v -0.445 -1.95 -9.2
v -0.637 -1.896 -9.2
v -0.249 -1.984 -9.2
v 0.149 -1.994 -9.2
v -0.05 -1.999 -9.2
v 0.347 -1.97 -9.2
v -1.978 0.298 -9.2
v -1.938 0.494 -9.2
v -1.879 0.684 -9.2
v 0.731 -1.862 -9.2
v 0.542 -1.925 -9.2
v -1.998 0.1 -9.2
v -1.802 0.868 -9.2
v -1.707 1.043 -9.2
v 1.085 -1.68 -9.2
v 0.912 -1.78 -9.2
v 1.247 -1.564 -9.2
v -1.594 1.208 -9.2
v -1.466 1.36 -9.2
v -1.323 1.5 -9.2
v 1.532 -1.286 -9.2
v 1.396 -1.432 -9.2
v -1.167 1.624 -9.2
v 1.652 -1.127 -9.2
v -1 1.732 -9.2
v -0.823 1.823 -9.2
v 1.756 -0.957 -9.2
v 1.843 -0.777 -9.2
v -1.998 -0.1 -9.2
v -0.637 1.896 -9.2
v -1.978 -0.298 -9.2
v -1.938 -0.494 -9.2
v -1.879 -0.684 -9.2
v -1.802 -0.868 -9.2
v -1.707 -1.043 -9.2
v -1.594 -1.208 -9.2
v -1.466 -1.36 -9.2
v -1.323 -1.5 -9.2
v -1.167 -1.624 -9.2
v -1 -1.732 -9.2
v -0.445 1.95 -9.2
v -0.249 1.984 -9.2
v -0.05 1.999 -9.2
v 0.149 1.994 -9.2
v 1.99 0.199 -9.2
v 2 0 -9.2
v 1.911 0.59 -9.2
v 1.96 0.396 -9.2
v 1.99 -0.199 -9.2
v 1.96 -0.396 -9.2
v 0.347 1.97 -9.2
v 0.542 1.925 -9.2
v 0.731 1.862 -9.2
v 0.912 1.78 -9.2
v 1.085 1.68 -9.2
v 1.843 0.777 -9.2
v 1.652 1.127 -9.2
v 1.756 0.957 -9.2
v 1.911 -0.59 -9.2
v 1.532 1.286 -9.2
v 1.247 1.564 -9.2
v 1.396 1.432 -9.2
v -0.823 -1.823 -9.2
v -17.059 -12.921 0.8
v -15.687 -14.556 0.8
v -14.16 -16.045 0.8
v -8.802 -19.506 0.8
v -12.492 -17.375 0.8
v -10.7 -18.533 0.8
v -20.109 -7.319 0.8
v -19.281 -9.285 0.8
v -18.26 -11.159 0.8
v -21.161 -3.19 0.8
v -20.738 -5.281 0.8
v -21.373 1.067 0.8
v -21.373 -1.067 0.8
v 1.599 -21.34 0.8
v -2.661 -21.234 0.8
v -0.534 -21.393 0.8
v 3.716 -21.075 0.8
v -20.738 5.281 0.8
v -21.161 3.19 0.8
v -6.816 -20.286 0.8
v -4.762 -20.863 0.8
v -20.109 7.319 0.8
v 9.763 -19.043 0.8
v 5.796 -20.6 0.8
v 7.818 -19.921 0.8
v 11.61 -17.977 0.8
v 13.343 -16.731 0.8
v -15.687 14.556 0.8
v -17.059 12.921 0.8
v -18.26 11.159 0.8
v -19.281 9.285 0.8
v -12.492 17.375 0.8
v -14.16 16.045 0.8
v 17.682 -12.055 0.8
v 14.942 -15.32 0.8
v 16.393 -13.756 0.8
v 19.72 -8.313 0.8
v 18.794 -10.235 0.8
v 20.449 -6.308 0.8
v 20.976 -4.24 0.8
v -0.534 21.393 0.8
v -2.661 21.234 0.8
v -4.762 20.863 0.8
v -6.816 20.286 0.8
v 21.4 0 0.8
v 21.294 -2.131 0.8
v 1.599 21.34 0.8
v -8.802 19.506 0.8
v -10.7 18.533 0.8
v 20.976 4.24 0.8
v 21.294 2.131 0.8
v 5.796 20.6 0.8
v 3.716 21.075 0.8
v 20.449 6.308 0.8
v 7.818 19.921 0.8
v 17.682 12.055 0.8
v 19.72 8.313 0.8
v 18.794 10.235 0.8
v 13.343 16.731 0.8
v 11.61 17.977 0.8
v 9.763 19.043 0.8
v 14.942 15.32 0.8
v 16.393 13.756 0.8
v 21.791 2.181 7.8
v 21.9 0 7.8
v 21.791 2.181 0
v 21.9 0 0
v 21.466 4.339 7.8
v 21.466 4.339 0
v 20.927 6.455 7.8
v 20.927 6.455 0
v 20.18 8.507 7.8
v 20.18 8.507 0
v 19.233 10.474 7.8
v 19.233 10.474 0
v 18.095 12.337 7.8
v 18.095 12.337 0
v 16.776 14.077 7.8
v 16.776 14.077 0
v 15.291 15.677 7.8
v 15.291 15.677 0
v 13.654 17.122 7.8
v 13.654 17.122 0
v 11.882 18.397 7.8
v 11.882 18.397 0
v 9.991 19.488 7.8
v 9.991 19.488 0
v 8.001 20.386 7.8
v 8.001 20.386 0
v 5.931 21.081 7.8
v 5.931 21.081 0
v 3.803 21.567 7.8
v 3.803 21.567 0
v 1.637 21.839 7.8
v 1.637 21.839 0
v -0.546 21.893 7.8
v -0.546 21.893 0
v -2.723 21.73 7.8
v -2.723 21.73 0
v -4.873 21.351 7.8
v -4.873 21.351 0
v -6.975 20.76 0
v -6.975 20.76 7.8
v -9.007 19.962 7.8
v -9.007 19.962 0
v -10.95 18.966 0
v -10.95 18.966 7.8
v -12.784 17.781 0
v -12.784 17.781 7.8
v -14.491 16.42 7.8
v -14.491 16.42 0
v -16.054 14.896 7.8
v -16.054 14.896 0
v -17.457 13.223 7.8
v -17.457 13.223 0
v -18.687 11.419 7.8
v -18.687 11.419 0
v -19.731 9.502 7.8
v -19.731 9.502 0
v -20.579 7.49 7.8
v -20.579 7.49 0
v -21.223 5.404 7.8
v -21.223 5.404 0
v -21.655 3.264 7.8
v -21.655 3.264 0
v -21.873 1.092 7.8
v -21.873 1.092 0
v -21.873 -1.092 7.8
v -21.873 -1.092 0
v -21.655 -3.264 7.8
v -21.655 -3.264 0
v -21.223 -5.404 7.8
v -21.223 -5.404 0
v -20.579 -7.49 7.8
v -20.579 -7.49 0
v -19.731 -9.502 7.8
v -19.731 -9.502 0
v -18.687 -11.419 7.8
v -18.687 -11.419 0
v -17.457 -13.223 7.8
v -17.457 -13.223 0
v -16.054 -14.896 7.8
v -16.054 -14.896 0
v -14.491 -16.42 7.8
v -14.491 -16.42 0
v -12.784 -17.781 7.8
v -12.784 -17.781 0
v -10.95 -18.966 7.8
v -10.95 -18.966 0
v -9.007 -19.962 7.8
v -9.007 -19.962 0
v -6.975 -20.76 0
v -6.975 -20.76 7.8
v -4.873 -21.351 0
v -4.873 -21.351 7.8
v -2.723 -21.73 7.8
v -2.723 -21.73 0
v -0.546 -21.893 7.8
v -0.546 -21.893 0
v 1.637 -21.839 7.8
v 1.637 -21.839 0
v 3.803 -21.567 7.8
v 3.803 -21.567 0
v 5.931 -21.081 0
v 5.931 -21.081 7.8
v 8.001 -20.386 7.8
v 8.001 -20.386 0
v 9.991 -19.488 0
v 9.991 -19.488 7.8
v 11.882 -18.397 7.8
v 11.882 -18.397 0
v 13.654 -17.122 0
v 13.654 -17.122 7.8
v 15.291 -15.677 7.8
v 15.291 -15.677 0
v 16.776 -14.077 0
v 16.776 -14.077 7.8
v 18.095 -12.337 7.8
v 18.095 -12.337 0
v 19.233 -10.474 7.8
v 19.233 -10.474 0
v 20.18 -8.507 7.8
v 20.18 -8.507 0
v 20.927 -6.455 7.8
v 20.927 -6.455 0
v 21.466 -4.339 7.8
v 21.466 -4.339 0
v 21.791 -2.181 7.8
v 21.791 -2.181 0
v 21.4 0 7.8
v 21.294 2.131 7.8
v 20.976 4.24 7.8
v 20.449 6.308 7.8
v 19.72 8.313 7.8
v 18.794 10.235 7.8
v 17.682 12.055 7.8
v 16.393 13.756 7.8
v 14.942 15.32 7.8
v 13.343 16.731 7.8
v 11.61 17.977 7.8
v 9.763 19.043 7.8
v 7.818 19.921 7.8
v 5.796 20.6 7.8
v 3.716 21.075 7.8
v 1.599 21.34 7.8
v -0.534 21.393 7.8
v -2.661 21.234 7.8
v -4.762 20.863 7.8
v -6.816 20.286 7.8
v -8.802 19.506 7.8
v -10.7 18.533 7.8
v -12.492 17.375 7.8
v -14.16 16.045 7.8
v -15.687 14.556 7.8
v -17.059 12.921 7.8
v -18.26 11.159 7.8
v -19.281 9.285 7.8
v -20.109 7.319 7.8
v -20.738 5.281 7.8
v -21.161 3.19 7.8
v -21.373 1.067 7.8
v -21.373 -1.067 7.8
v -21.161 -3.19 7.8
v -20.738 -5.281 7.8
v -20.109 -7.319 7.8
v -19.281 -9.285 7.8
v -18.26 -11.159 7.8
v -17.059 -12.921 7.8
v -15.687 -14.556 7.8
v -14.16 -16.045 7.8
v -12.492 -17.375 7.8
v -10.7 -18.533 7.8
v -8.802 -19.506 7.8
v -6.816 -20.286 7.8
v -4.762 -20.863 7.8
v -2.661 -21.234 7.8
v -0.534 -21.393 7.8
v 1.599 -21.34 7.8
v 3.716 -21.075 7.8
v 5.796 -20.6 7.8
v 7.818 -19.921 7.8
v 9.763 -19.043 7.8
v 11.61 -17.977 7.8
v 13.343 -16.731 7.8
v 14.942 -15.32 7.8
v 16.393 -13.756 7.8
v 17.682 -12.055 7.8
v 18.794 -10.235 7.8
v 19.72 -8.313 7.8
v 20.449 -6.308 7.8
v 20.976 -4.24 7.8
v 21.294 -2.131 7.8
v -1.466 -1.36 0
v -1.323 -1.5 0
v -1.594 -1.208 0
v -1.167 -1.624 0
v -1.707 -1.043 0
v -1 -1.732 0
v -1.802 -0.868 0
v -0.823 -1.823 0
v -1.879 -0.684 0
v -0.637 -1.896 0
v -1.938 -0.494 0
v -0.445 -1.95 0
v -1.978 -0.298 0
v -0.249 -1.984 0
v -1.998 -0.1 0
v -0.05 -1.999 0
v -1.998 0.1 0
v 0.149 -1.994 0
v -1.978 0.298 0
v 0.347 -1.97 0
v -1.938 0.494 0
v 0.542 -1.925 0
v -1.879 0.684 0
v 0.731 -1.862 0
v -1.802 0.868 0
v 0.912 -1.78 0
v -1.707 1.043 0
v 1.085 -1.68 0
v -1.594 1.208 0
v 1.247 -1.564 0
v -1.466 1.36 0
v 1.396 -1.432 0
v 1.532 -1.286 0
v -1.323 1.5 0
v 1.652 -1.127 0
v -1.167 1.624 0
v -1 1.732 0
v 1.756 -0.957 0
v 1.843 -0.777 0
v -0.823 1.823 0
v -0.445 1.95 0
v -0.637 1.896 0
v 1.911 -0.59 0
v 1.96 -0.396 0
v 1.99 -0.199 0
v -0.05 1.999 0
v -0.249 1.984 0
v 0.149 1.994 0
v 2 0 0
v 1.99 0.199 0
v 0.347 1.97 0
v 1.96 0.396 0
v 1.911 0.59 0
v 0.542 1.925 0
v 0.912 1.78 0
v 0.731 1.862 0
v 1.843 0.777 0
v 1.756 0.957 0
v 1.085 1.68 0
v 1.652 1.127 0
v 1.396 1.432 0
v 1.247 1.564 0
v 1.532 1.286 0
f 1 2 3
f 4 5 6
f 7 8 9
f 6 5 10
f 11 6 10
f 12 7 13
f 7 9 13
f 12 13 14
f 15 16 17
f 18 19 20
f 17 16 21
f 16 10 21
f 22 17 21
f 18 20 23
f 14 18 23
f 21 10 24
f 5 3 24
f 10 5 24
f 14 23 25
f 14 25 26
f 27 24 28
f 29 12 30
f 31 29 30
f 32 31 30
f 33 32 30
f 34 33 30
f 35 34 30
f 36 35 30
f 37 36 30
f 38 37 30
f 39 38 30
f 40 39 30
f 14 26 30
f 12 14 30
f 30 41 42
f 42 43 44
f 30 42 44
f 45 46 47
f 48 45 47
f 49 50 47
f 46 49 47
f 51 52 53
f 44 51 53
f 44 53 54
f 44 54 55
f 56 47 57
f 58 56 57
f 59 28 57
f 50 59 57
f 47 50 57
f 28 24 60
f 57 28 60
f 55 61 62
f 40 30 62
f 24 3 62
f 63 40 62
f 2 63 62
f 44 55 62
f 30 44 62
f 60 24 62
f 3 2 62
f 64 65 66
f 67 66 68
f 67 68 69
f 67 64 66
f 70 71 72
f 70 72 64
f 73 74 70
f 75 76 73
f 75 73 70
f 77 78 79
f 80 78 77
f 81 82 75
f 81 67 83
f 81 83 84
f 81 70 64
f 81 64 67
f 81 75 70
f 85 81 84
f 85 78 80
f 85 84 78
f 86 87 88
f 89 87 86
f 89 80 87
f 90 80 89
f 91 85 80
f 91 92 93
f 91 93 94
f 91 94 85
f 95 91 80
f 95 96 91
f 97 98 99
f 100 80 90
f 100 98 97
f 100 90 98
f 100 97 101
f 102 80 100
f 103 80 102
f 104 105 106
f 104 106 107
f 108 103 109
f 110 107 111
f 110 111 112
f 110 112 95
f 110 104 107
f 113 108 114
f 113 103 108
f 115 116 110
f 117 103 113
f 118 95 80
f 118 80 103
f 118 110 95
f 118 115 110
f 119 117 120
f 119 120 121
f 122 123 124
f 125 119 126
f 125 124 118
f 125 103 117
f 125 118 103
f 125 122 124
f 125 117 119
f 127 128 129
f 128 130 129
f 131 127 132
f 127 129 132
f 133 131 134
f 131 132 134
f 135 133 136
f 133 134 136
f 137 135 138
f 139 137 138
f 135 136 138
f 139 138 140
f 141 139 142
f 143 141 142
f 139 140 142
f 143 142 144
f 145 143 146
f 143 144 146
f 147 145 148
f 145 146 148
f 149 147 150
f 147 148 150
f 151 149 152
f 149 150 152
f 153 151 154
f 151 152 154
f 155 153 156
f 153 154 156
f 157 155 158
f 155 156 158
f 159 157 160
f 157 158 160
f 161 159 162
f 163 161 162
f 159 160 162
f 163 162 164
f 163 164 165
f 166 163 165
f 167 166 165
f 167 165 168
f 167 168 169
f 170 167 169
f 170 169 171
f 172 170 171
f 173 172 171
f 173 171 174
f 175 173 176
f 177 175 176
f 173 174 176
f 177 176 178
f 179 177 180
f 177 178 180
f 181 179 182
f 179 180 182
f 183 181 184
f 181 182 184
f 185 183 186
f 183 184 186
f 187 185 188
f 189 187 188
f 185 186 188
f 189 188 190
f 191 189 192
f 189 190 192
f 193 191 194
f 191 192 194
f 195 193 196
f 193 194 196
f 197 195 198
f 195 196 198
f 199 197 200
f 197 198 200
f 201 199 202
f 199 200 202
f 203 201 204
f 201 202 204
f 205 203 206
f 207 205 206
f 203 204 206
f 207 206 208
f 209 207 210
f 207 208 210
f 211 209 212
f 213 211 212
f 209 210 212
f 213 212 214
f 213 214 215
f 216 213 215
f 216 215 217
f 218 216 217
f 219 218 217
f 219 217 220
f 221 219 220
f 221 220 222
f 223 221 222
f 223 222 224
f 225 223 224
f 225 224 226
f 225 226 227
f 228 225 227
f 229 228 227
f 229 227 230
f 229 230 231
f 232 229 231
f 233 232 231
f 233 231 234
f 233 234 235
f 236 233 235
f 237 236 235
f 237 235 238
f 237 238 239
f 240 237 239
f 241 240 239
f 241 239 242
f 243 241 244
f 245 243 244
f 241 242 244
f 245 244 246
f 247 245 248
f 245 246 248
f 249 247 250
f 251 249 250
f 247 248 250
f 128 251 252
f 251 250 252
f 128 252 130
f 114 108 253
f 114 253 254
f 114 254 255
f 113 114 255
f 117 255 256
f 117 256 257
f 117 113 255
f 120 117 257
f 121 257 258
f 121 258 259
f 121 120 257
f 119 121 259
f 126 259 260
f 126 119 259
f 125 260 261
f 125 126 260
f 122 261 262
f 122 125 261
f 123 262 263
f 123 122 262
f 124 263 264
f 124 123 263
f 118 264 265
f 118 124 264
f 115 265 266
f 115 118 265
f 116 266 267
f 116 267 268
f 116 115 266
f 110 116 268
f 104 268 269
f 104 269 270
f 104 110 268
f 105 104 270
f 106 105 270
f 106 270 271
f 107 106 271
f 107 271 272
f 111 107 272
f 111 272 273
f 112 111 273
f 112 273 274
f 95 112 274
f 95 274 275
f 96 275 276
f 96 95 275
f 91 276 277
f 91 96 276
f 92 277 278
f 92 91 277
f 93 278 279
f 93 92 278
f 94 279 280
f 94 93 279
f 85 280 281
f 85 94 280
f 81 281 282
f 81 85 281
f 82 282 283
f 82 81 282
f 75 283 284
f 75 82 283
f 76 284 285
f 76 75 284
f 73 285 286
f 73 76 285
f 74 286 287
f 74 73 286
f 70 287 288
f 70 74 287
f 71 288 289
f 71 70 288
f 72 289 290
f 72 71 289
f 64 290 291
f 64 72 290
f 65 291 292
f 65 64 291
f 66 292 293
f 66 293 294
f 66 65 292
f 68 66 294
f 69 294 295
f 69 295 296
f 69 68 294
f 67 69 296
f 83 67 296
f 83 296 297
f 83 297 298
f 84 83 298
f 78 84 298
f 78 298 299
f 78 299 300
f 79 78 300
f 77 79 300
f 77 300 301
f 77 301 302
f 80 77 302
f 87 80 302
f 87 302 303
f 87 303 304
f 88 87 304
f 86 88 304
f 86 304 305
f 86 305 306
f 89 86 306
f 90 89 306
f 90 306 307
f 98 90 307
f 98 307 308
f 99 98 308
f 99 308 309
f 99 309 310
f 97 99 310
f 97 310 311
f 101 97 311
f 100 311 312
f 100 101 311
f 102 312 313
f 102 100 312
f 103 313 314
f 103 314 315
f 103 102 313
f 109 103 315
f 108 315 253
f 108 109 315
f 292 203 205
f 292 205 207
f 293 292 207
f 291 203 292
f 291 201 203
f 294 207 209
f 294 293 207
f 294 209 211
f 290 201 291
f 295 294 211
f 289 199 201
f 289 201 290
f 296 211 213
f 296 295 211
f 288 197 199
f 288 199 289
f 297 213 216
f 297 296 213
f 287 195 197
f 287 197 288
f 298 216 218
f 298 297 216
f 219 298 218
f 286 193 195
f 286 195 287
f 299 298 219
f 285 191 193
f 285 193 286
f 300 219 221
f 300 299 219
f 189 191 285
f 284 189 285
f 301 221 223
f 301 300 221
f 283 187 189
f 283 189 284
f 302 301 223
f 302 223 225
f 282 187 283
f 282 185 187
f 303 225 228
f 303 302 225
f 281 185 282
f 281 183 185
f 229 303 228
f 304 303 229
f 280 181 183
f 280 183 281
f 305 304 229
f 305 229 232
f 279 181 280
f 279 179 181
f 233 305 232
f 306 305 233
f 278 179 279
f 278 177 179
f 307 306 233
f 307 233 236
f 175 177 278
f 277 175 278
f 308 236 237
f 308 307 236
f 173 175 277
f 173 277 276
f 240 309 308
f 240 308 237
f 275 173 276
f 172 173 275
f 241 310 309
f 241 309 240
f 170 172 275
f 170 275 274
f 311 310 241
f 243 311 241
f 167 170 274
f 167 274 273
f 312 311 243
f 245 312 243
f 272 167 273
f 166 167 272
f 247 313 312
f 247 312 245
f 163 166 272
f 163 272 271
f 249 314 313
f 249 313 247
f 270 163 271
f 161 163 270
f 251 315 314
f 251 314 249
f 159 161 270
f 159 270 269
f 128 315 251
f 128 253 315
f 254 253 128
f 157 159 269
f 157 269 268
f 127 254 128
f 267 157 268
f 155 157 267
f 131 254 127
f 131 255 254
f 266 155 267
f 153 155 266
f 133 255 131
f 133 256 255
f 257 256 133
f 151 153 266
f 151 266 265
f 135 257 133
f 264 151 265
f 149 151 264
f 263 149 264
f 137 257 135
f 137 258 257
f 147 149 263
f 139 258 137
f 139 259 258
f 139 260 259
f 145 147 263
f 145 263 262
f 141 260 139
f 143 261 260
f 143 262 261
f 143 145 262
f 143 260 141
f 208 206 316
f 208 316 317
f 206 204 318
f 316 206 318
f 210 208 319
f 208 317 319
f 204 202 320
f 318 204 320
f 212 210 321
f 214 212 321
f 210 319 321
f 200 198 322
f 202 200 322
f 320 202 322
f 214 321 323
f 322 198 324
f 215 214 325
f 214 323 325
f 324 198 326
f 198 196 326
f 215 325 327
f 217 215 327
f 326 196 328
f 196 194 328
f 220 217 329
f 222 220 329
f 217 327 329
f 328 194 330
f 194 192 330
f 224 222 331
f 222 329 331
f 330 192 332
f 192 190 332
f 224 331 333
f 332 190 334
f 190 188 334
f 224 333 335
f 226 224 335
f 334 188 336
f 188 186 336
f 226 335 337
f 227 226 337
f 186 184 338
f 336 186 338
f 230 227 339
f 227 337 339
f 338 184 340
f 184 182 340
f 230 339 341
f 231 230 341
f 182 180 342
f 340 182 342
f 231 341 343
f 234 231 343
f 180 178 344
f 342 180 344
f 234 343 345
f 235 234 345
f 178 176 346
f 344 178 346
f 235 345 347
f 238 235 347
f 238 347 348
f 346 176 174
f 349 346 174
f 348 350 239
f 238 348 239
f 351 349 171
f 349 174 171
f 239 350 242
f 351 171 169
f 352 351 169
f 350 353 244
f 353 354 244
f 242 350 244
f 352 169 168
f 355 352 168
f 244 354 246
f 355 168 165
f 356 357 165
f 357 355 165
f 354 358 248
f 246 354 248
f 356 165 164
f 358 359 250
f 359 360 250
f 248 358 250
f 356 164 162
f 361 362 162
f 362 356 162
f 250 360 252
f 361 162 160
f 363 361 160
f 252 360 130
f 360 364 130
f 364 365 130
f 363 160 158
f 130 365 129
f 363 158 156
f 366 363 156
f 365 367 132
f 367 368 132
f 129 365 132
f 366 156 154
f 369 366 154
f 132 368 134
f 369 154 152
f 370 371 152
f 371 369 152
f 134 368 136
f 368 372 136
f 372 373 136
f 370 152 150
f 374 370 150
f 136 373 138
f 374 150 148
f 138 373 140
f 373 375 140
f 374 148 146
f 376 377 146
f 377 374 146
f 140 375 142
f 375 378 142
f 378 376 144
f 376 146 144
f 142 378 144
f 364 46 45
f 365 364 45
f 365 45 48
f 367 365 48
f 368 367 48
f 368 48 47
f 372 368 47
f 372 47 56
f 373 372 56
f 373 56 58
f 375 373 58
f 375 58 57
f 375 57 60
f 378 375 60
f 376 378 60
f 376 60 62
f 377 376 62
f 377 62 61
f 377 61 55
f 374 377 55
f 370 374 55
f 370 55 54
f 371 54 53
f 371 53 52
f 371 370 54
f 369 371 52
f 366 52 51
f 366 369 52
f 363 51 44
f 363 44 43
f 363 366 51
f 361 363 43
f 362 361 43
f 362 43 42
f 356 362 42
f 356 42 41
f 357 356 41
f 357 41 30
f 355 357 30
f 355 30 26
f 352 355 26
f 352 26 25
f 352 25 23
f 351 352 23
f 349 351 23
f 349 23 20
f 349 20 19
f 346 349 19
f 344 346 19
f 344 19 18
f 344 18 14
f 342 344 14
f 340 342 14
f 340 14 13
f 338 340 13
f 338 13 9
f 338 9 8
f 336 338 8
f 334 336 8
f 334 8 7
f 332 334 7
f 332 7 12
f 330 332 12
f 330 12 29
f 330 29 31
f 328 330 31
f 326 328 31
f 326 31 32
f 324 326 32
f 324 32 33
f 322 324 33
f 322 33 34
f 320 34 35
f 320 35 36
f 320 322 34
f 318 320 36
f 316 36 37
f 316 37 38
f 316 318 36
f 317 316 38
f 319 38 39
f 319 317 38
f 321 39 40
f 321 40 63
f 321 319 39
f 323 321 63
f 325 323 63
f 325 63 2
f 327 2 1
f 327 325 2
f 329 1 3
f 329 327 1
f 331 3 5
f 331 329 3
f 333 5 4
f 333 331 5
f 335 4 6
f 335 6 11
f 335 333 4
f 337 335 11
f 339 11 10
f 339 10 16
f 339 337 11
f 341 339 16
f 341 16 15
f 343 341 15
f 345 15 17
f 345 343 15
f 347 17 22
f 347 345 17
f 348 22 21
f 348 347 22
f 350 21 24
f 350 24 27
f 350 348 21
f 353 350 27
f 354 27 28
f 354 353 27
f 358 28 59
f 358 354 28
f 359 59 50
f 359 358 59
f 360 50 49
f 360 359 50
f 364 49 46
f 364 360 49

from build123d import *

# Parameters (mm, degrees)
SKETCH1_R      = 21.9
EXTRUDE1_DEPTH = 0.8
SKETCH2_R      = 21.9
SKETCH2_R_2    = 21.4
EXTRUDE2_DEPTH = 7
SKETCH4_R      = 2
EXTRUDE4_DEPTH = 10


with BuildPart() as part:
    # Sketch1 → Extrude1 (new body)
    with BuildSketch(Plane.XY):
        Circle(SKETCH1_R)
    extrude(amount=EXTRUDE1_DEPTH)

    # Sketch2 → Extrude2 (add)
    with BuildSketch(Plane.XY.offset(0.8)):
        Circle(SKETCH2_R)
        Circle(SKETCH2_R_2, mode=Mode.SUBTRACT)
    extrude(amount=EXTRUDE2_DEPTH)

    # Sketch4 → Extrude4 (add)
    with BuildSketch(Plane.XY.offset(0.8)):
        Circle(SKETCH4_R)
    extrude(amount=-EXTRUDE4_DEPTH)


solid = part.part
